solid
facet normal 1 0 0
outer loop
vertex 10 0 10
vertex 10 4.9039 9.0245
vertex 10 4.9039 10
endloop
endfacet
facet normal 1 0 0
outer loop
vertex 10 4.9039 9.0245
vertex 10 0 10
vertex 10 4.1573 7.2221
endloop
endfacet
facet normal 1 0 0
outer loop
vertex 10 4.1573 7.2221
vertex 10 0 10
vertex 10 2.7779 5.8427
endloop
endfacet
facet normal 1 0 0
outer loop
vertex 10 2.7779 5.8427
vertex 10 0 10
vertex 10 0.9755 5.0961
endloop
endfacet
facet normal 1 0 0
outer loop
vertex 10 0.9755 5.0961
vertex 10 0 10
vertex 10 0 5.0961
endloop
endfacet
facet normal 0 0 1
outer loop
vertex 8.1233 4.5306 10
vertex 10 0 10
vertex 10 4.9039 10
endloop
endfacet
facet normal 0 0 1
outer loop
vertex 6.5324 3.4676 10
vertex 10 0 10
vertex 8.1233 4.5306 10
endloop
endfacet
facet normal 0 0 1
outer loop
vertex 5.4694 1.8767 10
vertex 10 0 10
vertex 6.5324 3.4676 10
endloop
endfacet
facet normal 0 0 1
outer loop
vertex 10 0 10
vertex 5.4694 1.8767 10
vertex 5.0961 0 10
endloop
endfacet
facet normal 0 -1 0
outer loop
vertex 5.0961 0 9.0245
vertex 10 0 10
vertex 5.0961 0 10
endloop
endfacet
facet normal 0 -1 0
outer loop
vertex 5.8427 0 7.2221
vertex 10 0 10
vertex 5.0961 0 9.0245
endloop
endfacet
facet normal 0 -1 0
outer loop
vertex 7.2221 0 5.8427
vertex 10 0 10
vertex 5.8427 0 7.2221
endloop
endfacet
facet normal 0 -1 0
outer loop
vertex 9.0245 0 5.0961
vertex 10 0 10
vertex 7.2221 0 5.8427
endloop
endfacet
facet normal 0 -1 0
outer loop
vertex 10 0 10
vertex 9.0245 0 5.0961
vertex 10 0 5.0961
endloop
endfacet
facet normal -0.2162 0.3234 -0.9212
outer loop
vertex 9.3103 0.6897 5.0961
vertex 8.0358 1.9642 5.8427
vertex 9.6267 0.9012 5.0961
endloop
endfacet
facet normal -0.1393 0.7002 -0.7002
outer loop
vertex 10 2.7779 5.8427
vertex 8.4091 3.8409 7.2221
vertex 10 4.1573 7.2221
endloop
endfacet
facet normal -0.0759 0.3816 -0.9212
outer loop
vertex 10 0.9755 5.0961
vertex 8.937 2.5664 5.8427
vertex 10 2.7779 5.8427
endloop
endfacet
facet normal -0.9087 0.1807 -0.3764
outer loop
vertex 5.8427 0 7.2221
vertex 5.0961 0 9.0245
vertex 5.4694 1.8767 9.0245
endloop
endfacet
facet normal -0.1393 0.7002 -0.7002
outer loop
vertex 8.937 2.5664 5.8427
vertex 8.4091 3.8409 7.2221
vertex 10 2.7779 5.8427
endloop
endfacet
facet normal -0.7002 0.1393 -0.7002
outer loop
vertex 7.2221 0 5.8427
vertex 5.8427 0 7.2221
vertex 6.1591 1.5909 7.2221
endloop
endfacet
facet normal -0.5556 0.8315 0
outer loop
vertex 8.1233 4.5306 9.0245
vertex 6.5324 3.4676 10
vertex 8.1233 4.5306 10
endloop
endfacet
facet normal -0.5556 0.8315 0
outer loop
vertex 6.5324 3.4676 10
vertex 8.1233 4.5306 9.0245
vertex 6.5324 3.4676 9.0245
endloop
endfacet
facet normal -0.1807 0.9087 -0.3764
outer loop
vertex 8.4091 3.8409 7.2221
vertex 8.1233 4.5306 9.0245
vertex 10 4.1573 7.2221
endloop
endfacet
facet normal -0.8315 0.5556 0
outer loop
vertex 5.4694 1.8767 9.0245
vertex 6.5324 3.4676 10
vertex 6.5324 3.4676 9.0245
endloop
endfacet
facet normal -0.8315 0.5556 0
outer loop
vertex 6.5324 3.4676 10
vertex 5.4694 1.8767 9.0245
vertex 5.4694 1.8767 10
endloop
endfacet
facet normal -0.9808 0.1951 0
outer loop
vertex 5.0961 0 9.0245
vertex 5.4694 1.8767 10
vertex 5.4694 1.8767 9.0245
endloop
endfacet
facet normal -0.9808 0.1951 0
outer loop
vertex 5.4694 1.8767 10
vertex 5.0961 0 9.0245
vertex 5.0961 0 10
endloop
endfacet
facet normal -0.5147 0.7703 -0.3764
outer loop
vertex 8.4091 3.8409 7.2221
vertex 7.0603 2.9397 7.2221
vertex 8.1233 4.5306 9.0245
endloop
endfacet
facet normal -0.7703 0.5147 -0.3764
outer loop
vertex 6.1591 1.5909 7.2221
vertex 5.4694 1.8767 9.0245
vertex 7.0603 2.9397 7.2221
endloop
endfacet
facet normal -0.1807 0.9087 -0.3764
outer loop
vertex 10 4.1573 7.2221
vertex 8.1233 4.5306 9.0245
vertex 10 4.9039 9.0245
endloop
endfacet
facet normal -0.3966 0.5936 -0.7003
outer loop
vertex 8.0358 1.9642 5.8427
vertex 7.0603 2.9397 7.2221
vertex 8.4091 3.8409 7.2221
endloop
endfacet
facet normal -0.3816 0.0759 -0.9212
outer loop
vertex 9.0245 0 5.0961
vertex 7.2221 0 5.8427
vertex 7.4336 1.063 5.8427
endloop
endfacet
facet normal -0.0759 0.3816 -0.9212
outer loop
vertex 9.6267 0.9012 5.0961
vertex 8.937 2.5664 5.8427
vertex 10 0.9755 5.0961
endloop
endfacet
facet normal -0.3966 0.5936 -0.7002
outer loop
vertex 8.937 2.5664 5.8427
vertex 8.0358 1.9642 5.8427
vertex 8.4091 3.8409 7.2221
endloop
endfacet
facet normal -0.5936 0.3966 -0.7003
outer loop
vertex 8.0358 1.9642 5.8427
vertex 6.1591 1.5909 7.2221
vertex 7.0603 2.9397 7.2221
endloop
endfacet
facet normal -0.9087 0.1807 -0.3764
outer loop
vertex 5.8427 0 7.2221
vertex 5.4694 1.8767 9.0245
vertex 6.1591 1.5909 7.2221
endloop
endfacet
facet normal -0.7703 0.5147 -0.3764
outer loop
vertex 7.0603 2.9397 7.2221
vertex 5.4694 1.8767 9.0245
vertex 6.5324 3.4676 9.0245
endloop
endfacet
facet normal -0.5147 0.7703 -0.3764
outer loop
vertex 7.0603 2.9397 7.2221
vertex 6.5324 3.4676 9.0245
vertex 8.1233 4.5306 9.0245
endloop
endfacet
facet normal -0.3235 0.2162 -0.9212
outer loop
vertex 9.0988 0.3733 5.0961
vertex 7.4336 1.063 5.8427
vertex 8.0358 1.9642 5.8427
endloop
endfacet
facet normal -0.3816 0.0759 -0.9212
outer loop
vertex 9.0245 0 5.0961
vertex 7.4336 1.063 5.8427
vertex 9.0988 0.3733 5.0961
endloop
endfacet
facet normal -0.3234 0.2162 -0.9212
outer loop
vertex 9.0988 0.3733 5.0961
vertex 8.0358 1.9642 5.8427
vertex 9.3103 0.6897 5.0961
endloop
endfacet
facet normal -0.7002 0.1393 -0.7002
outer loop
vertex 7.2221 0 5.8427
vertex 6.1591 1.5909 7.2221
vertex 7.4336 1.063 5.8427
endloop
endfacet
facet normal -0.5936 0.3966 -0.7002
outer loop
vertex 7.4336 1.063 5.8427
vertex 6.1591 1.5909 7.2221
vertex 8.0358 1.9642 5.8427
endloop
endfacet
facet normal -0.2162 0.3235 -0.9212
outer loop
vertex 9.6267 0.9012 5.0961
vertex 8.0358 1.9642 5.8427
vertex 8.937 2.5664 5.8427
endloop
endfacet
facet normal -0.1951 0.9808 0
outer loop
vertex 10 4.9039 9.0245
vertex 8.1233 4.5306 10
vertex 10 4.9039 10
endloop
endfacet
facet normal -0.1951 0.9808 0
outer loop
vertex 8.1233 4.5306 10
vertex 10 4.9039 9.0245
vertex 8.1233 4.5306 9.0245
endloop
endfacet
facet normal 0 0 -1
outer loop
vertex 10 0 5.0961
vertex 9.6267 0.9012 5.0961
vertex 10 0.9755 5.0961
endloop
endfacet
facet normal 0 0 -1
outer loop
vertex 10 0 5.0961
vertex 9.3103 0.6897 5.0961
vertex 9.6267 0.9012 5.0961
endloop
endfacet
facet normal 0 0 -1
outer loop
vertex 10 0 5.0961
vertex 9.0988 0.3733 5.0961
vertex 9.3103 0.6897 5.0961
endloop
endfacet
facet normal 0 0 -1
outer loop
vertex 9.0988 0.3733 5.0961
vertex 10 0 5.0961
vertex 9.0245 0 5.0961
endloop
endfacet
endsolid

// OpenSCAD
intersection()
{
    color([1,0,0])
    cube ([10,10,10]);

    color([0,0,1])
    translate ([10,0,10])
    sphere (r=5);
}
